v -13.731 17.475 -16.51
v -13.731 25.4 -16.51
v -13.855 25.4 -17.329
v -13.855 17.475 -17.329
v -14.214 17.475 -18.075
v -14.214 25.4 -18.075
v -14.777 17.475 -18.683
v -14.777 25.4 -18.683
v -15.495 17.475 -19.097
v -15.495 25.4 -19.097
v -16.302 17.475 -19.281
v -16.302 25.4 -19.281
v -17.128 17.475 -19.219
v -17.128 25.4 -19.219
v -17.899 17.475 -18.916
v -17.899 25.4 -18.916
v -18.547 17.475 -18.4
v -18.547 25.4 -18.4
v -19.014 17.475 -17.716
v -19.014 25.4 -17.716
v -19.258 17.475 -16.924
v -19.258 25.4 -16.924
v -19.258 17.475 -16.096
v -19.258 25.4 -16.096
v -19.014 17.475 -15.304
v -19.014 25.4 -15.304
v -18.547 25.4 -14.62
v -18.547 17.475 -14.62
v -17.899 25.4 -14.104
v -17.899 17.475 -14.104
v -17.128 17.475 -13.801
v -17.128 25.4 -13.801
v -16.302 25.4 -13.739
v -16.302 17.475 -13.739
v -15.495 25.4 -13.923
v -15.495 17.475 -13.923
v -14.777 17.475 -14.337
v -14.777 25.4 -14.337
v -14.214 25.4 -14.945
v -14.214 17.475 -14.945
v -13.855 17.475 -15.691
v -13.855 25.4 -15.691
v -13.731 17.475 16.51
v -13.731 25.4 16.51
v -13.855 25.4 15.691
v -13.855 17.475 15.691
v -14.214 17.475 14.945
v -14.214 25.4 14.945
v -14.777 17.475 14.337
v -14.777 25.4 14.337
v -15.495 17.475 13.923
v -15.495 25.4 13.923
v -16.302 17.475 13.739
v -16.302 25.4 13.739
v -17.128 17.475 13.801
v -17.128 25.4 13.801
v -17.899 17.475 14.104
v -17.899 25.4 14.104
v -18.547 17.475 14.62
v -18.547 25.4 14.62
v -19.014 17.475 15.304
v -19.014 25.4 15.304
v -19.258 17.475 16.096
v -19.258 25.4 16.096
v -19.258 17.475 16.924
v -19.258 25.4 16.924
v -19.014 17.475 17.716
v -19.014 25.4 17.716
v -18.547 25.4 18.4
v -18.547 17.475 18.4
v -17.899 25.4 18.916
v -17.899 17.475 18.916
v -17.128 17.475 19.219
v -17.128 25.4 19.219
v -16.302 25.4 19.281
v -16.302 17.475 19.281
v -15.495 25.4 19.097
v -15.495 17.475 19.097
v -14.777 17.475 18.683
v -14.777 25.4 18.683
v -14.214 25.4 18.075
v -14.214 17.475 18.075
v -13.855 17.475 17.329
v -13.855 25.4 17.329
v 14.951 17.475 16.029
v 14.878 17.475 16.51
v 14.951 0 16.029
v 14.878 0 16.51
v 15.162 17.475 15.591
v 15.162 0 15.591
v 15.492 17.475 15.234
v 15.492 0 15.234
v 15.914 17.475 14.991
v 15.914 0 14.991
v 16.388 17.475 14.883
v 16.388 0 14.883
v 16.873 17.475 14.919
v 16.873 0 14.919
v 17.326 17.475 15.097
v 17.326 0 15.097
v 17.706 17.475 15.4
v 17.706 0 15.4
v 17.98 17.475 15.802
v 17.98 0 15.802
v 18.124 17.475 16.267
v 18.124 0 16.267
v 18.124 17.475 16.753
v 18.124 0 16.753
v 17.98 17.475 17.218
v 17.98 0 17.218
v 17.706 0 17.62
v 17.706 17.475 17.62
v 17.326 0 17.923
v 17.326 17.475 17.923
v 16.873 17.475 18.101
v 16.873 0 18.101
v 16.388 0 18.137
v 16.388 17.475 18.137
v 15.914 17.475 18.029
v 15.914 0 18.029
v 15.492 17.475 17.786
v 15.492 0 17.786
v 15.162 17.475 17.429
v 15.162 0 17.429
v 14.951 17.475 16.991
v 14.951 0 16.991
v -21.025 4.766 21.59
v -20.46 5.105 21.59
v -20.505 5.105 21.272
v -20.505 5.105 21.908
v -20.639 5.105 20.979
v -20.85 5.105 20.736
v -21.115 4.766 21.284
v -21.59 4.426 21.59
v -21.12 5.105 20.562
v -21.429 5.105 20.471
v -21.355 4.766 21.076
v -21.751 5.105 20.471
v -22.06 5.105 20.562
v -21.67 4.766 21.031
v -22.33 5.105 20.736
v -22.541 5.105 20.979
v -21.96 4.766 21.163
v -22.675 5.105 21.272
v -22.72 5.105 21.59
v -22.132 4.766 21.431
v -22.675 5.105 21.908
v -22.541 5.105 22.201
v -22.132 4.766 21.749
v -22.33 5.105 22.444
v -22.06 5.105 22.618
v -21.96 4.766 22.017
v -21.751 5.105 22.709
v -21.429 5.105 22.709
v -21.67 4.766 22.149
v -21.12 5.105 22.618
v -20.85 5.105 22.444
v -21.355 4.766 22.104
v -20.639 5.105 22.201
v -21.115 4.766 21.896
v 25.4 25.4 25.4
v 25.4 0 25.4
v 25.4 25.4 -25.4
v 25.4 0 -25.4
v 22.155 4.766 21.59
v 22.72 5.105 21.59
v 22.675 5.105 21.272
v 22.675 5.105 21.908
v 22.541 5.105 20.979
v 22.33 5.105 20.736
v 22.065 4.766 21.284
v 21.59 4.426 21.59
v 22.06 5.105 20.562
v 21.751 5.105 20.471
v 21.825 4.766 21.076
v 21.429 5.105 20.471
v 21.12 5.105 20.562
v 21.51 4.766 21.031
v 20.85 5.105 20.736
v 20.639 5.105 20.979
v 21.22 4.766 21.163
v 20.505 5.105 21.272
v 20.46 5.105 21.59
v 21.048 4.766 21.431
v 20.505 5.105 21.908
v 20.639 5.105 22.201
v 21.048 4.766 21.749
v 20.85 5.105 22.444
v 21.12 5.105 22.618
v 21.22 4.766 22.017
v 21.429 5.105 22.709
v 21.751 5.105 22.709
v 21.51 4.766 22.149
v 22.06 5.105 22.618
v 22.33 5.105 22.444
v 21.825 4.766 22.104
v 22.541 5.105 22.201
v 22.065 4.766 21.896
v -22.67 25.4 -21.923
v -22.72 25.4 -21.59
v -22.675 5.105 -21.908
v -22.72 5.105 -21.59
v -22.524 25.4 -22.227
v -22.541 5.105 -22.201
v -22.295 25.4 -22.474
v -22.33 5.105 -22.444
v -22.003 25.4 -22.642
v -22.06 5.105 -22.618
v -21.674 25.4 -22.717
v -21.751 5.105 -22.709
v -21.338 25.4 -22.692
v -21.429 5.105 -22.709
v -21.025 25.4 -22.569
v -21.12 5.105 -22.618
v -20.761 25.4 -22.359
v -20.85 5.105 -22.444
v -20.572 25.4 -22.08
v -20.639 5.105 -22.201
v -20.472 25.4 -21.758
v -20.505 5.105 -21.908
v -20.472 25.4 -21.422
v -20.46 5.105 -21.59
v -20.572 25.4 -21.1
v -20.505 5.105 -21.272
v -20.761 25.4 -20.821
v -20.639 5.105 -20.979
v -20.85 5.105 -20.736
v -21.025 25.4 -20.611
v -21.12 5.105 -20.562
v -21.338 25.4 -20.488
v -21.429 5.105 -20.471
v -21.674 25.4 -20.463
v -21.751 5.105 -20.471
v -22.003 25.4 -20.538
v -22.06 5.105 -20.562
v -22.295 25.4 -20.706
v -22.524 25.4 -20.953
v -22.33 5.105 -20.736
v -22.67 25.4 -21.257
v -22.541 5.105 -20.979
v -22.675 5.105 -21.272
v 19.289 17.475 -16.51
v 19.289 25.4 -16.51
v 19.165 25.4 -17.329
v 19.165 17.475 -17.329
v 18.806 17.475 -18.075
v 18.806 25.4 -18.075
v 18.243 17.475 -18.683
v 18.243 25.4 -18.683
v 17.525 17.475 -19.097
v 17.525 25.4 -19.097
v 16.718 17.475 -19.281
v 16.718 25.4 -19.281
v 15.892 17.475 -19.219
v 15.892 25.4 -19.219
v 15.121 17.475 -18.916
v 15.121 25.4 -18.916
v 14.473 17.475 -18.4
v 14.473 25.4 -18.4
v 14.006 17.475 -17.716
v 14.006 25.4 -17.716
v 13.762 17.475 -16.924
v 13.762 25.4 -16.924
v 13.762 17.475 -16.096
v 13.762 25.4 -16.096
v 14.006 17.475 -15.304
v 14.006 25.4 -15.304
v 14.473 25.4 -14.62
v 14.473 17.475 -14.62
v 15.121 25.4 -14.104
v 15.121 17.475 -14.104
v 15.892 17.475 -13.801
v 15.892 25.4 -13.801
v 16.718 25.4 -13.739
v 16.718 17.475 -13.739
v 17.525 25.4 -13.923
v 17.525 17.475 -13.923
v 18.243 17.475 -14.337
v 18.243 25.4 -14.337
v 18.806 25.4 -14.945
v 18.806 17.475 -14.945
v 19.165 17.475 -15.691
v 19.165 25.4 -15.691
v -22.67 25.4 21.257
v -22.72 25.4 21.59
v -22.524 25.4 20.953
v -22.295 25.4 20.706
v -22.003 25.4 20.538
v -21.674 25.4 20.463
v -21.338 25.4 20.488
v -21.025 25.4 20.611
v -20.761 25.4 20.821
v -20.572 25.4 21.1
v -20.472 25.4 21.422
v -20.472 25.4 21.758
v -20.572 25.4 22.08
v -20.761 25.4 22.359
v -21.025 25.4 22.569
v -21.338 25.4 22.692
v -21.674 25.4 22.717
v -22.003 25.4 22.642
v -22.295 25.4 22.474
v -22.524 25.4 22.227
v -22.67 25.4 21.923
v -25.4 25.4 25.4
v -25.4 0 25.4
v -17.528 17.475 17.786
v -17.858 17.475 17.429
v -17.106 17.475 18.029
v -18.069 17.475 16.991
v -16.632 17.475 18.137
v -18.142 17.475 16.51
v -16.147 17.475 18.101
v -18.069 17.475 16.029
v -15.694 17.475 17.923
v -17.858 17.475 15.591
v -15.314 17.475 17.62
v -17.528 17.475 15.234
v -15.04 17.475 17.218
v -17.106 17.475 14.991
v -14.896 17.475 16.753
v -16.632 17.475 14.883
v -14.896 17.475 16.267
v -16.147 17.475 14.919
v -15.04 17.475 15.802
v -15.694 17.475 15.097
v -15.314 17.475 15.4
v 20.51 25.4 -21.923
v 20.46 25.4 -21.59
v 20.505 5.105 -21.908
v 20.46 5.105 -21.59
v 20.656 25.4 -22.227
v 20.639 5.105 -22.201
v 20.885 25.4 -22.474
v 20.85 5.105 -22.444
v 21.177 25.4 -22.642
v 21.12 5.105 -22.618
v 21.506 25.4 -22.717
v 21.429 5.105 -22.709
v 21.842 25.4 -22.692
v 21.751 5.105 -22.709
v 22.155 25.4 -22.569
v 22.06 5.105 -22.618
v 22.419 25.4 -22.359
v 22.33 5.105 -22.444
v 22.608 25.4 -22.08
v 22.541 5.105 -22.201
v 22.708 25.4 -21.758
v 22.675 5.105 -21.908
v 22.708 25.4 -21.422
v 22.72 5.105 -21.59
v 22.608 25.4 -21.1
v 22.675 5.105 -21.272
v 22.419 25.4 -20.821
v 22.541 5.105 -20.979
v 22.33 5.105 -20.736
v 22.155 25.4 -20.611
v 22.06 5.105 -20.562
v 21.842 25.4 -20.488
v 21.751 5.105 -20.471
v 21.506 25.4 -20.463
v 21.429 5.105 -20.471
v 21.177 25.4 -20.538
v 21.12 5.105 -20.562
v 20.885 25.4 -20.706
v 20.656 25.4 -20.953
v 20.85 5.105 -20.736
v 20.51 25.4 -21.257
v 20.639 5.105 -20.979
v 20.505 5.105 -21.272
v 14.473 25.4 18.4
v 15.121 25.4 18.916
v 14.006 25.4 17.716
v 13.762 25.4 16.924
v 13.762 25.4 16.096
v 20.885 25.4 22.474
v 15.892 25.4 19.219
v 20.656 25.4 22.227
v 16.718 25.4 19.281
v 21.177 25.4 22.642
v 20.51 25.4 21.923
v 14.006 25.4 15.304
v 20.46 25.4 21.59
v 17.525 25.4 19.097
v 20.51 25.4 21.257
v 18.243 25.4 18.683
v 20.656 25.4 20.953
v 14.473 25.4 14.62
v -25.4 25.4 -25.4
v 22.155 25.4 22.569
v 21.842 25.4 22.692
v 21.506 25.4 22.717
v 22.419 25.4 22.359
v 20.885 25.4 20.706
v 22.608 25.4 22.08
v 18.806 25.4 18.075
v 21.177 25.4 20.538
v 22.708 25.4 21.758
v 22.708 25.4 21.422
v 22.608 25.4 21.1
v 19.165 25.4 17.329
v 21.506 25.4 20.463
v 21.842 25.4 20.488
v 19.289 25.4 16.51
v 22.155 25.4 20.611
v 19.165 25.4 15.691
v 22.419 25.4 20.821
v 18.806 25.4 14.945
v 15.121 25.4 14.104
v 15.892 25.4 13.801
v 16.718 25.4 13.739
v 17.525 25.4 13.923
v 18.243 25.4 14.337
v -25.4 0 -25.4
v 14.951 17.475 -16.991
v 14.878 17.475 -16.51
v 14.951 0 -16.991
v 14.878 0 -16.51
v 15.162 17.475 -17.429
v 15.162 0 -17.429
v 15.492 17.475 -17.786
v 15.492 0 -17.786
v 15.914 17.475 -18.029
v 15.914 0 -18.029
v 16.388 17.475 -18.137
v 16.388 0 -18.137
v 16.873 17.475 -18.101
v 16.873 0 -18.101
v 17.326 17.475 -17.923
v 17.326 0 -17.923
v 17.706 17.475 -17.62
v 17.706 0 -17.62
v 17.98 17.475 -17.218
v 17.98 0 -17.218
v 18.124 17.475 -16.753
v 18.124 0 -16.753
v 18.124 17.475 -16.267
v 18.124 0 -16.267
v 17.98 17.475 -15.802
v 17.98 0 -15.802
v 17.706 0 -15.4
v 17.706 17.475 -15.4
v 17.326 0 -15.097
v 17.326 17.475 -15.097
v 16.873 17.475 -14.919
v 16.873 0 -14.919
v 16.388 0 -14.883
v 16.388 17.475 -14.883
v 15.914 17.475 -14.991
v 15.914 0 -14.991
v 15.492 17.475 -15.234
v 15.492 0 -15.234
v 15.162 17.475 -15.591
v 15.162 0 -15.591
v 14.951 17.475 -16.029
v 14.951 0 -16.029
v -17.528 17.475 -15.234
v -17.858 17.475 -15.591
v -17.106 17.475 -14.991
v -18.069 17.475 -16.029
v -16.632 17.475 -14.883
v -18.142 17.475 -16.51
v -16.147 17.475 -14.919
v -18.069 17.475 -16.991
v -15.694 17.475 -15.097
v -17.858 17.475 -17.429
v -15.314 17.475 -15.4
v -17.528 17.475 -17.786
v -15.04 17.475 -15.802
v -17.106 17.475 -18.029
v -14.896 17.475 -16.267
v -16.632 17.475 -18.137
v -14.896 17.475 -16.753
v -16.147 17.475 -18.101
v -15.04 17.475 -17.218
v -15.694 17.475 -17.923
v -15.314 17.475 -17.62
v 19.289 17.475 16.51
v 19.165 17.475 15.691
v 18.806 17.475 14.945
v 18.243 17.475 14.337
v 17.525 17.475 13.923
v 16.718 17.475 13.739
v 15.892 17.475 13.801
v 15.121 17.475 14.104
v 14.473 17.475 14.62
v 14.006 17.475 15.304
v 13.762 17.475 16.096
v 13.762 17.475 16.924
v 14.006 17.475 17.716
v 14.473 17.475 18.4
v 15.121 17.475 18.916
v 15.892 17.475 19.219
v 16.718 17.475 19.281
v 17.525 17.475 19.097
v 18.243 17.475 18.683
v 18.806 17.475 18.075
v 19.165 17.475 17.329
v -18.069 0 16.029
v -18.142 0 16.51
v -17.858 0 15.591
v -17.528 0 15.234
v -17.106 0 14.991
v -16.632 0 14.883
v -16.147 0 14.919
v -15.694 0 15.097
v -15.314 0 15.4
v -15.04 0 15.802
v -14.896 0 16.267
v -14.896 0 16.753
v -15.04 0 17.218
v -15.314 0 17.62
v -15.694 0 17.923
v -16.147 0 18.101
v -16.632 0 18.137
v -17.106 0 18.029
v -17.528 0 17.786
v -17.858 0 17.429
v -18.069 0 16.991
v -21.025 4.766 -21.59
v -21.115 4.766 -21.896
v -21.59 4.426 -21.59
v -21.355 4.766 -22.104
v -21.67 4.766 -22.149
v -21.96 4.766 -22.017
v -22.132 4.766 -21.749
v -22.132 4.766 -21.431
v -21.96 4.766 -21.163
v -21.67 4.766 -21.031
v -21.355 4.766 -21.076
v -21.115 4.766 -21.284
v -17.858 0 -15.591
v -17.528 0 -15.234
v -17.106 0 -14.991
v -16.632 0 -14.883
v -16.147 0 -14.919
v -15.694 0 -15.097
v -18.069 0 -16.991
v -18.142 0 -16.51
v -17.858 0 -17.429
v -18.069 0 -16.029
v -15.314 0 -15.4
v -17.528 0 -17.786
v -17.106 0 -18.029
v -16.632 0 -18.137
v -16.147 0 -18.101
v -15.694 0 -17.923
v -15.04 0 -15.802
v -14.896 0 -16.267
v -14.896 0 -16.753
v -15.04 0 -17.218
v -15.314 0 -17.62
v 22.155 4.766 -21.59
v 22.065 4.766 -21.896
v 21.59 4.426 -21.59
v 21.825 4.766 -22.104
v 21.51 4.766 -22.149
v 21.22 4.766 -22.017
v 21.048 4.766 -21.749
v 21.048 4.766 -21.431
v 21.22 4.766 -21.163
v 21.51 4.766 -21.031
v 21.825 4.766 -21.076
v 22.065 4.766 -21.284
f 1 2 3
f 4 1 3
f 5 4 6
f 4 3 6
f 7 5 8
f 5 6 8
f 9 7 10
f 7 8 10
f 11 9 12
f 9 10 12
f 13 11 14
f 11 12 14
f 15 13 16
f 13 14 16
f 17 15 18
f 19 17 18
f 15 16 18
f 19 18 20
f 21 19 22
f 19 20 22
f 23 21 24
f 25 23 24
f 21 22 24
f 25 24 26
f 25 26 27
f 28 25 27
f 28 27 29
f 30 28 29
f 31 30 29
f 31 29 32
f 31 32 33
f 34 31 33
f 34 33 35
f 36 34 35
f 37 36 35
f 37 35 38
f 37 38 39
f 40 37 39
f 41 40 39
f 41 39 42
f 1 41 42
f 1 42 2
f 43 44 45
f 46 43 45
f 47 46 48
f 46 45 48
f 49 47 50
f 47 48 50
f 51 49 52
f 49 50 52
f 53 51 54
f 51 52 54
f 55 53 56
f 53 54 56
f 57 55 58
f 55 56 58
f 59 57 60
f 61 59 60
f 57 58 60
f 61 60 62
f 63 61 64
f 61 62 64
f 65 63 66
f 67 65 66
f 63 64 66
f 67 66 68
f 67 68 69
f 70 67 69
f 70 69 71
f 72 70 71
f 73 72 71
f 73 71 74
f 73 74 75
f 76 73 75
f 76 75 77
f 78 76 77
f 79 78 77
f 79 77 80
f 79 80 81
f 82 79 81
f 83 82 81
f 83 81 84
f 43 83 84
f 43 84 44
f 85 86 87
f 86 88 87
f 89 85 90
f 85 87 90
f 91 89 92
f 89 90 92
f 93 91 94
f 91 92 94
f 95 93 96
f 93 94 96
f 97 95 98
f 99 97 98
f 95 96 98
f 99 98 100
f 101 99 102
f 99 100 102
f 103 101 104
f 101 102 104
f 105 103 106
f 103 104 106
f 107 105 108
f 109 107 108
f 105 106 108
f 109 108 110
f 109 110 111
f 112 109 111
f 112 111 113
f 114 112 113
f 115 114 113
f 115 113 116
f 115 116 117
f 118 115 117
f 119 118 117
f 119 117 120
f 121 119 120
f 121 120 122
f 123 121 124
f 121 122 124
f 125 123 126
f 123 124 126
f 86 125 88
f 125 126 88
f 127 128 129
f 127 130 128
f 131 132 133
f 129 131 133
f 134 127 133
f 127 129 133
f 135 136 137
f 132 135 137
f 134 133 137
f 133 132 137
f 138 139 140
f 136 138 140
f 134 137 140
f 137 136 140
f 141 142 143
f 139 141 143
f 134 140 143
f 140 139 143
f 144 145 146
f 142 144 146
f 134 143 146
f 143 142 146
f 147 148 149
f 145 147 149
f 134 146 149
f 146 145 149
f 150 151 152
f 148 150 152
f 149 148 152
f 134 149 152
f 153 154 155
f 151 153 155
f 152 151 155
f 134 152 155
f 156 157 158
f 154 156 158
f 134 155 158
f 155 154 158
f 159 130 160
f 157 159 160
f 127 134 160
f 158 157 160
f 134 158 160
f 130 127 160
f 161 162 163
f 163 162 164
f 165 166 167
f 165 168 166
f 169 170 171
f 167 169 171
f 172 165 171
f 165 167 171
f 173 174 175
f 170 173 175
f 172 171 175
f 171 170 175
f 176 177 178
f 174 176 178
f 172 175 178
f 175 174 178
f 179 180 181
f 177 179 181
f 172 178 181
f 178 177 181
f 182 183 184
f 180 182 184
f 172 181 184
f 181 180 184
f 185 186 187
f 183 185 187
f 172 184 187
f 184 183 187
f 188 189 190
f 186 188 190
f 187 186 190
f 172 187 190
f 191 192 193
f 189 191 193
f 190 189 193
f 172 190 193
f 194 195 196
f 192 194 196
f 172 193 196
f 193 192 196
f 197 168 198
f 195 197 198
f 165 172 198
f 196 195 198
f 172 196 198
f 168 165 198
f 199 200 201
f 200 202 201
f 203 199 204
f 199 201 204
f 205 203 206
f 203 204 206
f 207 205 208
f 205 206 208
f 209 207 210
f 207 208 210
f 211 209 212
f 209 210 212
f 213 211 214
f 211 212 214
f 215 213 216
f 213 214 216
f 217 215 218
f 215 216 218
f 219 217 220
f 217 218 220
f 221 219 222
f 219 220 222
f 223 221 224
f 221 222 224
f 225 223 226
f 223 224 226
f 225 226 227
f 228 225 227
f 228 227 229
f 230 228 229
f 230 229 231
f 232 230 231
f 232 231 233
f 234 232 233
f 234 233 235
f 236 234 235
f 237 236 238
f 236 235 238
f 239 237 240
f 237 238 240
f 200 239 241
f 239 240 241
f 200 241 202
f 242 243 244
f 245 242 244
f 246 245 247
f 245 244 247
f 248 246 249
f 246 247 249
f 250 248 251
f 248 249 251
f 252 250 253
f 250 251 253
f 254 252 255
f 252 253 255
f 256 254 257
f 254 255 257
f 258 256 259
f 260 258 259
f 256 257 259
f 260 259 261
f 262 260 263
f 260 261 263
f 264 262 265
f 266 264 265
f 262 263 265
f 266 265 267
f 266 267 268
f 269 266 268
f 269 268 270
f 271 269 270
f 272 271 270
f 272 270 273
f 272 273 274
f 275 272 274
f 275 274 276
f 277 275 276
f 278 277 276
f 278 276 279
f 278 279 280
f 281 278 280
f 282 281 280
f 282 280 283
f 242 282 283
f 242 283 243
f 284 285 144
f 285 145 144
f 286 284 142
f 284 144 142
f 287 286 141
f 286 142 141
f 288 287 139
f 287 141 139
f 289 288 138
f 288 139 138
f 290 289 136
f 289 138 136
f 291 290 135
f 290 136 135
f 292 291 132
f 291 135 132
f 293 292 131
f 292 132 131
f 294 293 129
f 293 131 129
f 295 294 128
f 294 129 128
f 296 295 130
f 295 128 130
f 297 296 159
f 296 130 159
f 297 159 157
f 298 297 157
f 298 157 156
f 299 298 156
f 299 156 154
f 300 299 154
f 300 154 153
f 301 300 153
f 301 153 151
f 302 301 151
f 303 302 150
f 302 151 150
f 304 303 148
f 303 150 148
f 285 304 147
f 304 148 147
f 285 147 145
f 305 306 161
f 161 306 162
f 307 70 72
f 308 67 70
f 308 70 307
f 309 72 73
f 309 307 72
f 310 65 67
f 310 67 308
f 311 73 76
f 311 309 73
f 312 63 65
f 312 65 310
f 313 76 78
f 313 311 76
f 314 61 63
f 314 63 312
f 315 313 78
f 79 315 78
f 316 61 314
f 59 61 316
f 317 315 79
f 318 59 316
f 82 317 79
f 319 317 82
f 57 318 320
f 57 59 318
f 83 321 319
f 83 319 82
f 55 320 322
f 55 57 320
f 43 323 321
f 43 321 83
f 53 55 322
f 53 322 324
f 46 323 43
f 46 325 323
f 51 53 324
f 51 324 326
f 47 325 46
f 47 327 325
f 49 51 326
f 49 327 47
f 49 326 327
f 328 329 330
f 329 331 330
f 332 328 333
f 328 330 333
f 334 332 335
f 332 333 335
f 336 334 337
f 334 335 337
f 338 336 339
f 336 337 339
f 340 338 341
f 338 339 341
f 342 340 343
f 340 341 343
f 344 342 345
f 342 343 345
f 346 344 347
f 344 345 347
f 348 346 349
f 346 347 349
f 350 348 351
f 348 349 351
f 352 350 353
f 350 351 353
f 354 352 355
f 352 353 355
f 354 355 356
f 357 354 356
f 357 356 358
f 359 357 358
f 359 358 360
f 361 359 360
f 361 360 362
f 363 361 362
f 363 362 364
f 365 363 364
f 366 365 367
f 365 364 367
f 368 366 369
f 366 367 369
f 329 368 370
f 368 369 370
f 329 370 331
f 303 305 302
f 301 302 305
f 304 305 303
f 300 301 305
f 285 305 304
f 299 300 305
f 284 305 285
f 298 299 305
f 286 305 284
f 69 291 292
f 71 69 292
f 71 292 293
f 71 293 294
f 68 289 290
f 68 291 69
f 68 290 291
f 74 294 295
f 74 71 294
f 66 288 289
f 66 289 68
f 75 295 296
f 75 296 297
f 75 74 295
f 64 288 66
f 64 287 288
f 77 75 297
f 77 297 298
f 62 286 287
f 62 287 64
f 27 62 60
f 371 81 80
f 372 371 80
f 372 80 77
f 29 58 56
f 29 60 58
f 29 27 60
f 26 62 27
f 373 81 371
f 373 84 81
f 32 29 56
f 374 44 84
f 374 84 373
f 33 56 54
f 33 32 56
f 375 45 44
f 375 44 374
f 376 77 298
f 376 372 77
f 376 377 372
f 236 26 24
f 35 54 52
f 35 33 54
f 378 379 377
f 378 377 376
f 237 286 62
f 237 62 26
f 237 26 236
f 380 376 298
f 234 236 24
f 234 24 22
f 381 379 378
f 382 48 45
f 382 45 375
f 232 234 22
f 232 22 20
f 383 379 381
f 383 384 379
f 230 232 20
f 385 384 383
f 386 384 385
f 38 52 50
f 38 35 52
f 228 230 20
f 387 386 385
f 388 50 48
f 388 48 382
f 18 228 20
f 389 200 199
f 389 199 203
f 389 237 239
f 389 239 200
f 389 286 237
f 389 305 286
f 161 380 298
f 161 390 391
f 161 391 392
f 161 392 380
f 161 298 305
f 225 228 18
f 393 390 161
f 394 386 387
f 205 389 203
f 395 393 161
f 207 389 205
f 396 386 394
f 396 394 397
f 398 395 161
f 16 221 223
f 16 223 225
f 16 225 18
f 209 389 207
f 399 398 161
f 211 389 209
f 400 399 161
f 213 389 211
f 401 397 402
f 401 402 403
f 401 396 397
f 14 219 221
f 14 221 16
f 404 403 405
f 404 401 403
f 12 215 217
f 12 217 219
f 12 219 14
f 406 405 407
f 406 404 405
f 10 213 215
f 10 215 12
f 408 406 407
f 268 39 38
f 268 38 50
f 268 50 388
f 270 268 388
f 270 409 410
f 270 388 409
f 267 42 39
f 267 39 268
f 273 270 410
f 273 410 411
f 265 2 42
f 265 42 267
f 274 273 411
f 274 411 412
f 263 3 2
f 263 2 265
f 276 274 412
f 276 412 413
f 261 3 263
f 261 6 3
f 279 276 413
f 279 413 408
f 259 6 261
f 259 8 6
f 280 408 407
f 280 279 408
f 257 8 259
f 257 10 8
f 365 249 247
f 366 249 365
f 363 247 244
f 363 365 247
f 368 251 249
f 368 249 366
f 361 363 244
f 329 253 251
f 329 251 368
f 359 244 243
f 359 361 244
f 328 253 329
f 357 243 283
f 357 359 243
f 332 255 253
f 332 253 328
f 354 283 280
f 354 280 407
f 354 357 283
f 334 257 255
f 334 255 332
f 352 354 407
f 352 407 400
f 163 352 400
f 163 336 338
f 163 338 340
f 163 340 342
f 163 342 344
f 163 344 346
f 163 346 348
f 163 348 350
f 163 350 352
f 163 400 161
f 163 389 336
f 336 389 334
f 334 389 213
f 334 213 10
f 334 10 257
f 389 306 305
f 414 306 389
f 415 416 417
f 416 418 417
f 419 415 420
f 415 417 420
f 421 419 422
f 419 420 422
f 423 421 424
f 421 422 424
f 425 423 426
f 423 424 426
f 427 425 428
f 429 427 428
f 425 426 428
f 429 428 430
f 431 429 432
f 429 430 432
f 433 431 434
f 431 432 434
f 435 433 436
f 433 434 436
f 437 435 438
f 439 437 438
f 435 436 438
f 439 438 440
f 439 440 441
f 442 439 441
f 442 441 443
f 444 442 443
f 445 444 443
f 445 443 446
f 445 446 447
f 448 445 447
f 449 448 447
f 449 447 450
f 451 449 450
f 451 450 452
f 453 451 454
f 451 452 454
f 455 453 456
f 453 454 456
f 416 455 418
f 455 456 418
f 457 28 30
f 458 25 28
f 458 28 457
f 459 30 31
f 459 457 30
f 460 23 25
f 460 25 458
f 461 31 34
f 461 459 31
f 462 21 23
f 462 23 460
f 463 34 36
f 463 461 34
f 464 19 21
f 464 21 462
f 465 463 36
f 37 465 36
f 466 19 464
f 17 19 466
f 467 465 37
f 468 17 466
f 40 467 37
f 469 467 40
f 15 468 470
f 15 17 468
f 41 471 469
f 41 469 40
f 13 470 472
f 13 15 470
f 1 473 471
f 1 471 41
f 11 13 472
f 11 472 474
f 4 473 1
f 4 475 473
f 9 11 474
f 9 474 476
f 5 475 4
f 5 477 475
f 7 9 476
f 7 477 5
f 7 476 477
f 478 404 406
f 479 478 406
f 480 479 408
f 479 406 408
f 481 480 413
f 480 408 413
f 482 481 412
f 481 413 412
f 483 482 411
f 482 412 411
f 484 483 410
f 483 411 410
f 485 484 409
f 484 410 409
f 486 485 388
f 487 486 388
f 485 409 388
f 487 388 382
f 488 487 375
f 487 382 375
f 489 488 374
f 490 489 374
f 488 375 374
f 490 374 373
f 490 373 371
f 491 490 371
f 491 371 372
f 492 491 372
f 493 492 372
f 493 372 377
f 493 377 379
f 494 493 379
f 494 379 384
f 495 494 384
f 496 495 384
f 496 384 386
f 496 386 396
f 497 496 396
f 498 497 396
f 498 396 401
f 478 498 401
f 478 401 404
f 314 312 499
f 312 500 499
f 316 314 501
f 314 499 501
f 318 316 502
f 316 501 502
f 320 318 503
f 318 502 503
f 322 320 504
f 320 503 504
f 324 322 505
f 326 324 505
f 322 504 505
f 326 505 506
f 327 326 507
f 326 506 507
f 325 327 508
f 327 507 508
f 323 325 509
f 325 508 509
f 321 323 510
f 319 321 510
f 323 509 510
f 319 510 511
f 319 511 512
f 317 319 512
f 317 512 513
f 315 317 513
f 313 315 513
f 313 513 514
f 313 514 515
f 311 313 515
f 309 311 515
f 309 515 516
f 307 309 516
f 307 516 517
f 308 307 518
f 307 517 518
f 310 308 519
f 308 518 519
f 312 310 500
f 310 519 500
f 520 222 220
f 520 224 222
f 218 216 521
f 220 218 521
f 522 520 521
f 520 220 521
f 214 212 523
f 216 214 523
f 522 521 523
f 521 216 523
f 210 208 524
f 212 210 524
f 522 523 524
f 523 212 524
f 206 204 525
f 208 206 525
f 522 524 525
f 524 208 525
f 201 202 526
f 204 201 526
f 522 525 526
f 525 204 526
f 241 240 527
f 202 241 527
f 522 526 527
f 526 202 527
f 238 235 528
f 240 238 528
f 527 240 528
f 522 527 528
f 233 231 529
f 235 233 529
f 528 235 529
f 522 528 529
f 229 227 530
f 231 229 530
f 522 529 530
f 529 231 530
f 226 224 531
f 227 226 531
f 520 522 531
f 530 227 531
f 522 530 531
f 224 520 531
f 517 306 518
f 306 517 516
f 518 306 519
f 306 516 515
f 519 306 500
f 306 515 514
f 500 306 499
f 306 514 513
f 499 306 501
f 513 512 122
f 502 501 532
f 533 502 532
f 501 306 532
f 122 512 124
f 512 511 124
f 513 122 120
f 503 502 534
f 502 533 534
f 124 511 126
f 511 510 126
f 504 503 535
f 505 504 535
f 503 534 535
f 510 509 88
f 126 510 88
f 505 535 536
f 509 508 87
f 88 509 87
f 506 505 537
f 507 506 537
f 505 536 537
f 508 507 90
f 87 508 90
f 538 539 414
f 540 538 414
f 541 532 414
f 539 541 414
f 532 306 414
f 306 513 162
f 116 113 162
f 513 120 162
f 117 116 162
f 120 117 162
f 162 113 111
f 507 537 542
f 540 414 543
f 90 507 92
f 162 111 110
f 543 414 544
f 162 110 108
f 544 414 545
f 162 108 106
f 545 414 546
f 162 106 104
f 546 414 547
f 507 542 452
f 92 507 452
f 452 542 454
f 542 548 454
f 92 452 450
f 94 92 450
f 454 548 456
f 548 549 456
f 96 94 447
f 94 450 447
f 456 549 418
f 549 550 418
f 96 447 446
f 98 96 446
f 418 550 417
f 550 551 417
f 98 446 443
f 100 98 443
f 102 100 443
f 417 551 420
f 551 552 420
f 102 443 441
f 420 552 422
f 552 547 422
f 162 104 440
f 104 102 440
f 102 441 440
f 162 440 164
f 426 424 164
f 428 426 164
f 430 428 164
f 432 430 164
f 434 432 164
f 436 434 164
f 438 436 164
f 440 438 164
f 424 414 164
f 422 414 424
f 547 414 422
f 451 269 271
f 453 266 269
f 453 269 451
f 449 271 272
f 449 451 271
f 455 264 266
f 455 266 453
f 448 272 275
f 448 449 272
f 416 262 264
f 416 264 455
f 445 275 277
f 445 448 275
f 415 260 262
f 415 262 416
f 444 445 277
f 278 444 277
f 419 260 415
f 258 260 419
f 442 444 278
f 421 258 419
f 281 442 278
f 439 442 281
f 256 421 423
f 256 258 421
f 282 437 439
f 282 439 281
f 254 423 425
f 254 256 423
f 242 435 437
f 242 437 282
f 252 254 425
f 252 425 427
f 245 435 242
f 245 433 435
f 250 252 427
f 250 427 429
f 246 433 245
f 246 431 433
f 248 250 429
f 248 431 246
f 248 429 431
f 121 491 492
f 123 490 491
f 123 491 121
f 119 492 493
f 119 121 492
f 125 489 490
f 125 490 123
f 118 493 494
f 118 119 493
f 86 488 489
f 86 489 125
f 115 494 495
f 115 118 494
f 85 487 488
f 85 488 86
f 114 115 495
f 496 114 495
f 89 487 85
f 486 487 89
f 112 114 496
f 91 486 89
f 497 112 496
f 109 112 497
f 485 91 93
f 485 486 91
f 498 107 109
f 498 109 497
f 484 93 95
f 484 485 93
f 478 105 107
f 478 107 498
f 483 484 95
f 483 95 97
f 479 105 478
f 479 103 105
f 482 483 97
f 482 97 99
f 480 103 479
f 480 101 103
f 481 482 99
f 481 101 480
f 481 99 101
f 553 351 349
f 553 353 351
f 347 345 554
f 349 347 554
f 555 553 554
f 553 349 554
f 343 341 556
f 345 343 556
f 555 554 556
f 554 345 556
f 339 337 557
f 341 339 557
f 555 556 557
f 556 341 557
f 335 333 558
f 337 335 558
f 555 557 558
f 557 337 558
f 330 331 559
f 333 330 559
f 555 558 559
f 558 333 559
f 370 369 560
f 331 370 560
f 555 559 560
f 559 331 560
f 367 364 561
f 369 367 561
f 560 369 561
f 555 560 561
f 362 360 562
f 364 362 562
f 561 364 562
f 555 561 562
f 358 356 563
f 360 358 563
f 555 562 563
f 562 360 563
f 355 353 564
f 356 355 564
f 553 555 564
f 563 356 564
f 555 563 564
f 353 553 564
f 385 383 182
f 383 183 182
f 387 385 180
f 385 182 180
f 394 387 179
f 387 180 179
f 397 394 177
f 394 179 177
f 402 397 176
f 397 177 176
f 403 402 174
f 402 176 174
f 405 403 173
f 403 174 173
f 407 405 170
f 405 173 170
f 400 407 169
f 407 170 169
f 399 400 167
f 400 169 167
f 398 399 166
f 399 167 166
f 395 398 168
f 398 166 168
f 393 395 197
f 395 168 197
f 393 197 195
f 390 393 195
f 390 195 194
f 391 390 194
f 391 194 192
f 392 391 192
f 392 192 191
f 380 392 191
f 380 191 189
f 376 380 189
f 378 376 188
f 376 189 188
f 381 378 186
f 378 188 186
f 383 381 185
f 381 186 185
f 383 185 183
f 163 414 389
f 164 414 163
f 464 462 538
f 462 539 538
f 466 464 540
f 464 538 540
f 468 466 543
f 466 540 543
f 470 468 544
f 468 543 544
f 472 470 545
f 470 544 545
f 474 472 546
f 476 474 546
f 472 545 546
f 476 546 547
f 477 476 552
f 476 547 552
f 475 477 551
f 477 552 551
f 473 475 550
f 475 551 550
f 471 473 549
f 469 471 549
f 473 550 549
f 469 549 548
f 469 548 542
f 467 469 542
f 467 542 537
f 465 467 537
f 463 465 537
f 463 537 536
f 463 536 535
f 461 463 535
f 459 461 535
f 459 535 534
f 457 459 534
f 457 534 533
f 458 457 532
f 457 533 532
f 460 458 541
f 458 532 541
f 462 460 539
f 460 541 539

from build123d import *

# Parameters (mm, degrees)
SKETCH1_W                                      = 50.8
SKETCH1_H                                      = 50.8
BOSS_EXTRUDE1_DEPTH                            = 25.4
F_4_40_TAPPED_HOLE1_D                          = 2.2606
F_4_40_TAPPED_HOLE1_DEPTH                      = 20.2946
F_4_40_TAPPED_HOLE1_TIP                        = 0.679152758
CBORE_FOR_4_SOCKET_HEAD_CAP_SCREW1_D           = 3.2639
CBORE_FOR_4_SOCKET_HEAD_CAP_SCREW1_CBORE_D     = 5.55752
CBORE_FOR_4_SOCKET_HEAD_CAP_SCREW1_CBORE_DEPTH = 7.9248


with BuildPart() as part:
    # Sketch1 → Boss-Extrude1 (new body)
    with BuildSketch(Plane(origin=(0, 0, 0), x_dir=(1, 0, 0), z_dir=(0, 1, 0))):
        Rectangle(SKETCH1_W, SKETCH1_H)
    extrude(amount=BOSS_EXTRUDE1_DEPTH)

    # #4-40 Tapped Hole1
    with Locations(Plane(origin=(0, 25.4, 0), x_dir=(1, 0, 0), z_dir=(0, 1, 0))):
        with Locations((-21.59, 21.59), (21.59, 21.59), (21.59, -21.59), (-21.59, -21.59)):
            Hole(F_4_40_TAPPED_HOLE1_D / 2, depth=F_4_40_TAPPED_HOLE1_DEPTH)
            with Locations((0, 0, -(F_4_40_TAPPED_HOLE1_DEPTH + F_4_40_TAPPED_HOLE1_TIP / 2))):  # 118° drill point
                Cone(0, F_4_40_TAPPED_HOLE1_D / 2, F_4_40_TAPPED_HOLE1_TIP, mode=Mode.SUBTRACT)

    # CBORE for #4 Socket Head Cap Screw1 (through all)
    with Locations(Plane(origin=(0, 25.4, 0), x_dir=(1, 0, 0), z_dir=(0, 1, 0))):
        with Locations((-16.51, 16.51), (16.51, 16.51), (16.51, -16.51), (-16.51, -16.51)):
            CounterBoreHole(CBORE_FOR_4_SOCKET_HEAD_CAP_SCREW1_D / 2, CBORE_FOR_4_SOCKET_HEAD_CAP_SCREW1_CBORE_D / 2, CBORE_FOR_4_SOCKET_HEAD_CAP_SCREW1_CBORE_DEPTH)


solid = part.part
